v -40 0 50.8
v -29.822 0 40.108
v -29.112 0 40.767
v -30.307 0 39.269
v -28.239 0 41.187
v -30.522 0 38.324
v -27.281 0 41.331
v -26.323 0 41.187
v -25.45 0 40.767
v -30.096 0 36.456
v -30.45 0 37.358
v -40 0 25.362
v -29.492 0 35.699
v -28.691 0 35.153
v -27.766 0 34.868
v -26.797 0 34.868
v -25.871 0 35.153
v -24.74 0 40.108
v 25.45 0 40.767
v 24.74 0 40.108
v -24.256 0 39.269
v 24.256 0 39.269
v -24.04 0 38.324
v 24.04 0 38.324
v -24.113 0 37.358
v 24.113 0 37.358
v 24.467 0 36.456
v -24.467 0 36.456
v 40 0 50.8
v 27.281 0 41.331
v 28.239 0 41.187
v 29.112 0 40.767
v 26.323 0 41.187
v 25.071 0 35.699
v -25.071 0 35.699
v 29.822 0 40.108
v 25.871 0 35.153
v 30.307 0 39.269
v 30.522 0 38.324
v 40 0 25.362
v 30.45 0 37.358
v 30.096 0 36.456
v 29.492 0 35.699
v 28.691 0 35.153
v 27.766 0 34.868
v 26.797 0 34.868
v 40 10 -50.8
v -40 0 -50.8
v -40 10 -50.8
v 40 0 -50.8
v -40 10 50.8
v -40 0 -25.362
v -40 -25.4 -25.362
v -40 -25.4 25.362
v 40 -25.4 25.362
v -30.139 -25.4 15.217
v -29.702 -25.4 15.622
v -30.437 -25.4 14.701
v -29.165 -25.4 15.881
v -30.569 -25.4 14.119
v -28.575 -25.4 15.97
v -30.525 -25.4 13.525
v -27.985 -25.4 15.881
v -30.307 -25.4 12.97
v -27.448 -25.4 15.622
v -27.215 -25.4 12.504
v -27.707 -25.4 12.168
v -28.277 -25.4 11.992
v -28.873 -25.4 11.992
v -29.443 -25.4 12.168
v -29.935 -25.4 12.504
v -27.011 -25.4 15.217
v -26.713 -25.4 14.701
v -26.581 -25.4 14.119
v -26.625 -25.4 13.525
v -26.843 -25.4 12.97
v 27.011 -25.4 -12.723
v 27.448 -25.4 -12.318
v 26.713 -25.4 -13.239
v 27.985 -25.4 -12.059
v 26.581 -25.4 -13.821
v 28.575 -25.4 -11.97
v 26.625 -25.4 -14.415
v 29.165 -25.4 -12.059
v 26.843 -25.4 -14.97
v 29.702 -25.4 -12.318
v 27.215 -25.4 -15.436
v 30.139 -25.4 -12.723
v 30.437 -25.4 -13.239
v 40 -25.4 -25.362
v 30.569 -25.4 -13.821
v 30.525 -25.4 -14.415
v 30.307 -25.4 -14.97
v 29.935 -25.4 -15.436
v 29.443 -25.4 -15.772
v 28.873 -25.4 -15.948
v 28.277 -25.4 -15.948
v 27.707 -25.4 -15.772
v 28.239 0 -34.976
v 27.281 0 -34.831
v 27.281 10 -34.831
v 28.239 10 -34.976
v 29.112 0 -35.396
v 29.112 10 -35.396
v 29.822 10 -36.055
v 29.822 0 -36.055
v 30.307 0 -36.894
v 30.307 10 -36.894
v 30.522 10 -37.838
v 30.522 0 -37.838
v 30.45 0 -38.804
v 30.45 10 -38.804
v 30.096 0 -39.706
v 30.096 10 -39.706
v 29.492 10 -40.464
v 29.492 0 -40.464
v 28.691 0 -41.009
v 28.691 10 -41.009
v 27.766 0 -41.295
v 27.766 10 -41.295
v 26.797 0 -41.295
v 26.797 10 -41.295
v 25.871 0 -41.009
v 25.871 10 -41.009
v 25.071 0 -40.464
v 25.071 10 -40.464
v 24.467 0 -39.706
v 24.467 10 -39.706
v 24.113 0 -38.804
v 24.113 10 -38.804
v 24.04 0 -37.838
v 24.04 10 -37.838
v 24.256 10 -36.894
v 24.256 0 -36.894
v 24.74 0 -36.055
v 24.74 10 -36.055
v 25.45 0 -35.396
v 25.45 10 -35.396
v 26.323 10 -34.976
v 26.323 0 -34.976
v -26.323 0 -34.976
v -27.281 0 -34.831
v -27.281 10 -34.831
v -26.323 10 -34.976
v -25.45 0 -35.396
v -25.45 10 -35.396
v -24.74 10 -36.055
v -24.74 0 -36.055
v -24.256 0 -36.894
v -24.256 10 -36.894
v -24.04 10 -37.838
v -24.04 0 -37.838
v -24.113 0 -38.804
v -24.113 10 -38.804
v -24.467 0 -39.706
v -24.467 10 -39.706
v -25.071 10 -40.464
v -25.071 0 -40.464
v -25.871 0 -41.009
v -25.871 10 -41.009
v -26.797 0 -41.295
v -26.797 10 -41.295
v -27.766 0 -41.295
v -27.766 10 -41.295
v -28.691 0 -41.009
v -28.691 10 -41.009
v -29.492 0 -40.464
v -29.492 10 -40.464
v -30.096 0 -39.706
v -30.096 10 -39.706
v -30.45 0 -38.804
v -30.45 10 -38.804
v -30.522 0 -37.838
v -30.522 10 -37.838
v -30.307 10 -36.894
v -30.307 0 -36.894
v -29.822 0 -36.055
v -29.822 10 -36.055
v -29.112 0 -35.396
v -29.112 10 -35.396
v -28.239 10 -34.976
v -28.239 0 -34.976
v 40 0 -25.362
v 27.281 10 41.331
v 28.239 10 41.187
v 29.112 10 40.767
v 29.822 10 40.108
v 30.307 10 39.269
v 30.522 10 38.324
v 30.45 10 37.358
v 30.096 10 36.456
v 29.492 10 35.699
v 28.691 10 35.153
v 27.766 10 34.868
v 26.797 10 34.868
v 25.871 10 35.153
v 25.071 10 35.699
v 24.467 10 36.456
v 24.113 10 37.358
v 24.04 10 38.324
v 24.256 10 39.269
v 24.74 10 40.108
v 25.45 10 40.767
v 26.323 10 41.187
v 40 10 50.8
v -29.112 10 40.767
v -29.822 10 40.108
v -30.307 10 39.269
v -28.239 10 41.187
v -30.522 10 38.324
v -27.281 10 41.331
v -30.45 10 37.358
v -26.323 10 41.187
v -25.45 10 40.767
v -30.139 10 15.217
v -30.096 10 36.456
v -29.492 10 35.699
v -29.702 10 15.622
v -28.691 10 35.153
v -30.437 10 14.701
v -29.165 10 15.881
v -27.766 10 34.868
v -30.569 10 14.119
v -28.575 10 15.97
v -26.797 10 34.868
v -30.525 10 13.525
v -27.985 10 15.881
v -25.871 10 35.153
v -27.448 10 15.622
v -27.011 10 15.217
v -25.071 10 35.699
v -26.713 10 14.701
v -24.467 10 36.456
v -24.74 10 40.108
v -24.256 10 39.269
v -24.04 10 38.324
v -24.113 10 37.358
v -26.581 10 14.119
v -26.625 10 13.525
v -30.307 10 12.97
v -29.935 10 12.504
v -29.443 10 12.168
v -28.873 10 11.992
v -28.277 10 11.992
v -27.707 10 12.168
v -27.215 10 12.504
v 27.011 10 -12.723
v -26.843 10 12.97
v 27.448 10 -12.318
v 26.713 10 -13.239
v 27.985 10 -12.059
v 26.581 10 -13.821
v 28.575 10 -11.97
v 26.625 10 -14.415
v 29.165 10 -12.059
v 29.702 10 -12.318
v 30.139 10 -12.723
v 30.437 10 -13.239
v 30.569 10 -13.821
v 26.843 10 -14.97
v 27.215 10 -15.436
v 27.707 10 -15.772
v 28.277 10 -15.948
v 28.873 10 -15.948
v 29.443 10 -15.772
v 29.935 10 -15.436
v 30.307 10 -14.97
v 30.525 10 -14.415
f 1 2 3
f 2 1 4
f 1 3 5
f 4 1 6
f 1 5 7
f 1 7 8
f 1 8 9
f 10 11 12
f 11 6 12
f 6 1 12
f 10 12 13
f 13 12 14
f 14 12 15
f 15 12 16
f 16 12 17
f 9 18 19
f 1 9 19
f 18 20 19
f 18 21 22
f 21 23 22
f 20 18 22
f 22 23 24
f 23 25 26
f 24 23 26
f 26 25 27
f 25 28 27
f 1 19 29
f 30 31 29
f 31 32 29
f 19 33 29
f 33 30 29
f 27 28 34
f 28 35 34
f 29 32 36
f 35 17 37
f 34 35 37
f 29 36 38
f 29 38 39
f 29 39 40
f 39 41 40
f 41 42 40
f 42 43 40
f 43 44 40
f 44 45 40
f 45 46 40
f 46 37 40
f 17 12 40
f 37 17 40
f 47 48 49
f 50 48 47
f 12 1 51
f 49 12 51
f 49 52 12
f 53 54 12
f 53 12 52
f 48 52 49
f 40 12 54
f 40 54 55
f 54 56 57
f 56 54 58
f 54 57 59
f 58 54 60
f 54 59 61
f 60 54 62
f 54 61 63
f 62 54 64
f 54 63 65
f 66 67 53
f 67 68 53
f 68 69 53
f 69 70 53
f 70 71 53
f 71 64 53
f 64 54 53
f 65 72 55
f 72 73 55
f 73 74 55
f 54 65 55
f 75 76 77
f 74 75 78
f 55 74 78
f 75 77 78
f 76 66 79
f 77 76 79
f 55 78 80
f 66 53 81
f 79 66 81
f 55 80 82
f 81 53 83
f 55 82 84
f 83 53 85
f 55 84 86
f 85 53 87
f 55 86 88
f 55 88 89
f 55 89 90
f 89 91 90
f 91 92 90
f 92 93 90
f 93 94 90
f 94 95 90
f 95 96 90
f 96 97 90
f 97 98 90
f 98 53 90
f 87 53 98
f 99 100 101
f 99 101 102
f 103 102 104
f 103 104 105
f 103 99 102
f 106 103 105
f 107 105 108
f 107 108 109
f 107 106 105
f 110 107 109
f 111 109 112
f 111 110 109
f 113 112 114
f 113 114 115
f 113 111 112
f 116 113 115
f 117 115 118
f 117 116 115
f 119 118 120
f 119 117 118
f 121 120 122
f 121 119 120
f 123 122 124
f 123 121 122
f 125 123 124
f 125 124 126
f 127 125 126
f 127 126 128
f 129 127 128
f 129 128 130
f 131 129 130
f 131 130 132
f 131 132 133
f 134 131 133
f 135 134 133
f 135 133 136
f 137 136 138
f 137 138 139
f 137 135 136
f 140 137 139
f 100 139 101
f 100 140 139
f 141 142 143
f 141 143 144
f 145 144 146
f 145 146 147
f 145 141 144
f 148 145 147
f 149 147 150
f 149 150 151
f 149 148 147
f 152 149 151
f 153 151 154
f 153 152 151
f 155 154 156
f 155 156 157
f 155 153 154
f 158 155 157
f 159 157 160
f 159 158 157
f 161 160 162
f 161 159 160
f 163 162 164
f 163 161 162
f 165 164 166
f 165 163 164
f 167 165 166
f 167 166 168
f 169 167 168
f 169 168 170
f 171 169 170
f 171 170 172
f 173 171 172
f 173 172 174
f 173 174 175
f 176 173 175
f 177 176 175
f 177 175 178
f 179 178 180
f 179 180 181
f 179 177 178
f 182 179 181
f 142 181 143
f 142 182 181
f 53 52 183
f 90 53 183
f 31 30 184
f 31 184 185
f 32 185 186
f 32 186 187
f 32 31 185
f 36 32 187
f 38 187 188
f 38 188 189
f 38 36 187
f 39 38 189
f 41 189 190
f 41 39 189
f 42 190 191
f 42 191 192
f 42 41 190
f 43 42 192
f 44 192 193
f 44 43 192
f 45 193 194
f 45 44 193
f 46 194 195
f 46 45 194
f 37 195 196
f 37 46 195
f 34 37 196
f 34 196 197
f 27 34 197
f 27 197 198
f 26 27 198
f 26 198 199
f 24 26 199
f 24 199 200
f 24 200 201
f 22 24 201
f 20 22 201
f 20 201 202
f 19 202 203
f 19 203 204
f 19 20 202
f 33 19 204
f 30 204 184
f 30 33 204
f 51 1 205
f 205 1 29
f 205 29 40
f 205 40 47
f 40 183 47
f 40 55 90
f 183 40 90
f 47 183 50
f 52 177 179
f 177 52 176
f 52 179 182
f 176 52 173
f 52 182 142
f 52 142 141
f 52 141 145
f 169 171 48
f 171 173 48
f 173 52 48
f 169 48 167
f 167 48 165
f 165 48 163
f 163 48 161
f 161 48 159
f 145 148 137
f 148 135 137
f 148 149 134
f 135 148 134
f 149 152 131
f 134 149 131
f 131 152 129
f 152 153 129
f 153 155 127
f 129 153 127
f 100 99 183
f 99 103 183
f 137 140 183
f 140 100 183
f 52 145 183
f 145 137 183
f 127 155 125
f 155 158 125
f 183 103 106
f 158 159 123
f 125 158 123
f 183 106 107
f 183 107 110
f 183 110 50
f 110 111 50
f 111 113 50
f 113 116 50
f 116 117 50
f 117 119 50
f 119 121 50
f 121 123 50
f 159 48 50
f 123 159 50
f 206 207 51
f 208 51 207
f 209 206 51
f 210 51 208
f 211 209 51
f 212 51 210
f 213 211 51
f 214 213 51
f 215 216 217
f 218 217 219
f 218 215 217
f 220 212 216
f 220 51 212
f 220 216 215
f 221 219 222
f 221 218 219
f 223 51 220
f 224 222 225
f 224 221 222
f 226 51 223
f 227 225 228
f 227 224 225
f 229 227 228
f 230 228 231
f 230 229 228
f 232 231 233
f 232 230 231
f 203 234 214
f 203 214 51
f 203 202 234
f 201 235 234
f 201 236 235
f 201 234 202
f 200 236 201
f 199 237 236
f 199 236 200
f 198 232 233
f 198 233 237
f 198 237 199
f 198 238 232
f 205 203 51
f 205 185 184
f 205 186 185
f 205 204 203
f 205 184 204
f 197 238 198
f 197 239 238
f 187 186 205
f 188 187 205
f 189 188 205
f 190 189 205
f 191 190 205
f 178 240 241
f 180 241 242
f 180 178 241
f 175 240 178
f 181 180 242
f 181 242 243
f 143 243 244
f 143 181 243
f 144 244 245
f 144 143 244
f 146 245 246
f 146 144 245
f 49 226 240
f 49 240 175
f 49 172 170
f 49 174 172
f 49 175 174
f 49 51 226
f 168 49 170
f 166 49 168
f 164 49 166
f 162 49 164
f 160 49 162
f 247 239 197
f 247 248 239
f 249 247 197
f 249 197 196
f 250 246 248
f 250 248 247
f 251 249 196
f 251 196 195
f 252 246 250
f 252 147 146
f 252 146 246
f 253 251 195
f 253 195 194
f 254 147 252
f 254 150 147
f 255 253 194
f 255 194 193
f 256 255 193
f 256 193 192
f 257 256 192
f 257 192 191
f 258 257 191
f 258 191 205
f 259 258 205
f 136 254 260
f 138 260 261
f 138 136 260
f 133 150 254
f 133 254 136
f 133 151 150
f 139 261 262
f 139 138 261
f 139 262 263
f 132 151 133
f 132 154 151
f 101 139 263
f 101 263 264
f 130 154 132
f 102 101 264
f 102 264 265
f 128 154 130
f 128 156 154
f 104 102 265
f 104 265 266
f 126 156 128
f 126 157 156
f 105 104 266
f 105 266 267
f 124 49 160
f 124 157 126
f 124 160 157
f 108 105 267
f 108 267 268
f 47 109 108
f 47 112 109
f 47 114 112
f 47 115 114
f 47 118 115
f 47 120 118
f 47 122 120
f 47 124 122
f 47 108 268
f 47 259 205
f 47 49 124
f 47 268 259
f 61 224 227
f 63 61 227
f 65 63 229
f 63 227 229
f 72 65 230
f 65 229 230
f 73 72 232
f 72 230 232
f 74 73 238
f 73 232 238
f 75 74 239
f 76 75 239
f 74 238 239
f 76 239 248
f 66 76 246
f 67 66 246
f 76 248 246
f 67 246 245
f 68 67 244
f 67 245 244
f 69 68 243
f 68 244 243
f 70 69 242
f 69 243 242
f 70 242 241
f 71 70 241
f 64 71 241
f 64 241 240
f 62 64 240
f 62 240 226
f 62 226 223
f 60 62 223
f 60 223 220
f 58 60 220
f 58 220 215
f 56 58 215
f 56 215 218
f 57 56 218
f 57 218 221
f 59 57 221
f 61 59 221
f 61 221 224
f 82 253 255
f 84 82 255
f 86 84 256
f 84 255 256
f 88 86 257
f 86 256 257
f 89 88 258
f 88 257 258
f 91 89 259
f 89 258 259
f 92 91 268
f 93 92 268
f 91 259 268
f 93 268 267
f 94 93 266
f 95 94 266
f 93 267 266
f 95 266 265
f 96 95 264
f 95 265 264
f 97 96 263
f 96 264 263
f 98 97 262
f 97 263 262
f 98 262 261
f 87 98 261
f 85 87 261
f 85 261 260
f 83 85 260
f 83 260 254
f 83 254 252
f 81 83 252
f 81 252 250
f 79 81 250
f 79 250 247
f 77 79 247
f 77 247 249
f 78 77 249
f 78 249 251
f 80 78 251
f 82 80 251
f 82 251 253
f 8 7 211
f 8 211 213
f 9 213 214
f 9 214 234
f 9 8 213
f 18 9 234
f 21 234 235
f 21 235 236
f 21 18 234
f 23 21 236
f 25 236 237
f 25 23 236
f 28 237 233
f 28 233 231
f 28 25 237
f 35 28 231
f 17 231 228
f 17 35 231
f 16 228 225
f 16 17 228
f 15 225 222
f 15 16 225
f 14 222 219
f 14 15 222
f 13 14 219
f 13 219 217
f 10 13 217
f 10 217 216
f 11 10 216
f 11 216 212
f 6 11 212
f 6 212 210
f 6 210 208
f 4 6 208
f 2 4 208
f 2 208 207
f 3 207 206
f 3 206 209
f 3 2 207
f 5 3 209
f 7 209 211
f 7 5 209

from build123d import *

# Parameters (mm, degrees)
SKETCH1_W           = 80
SKETCH1_H           = 101.6
SKETCH1_R           = 3.25
BOSS_EXTRUDE1_DEPTH = 10
SKETCH1_3_W         = 80
SKETCH1_3_H         = 50.725
BOSS_EXTRUDE2_DEPTH = 25.4
SKETCH2_R           = 2
CUT_EXTRUDE1_DEPTH  = 74.7143134


with BuildPart() as part:
    # Sketch1 → Boss-Extrude1 (new body)
    with BuildSketch(Plane(origin=(0, 0, 0), x_dir=(1, 0, 0), z_dir=(0, 1, 0))):
        Rectangle(SKETCH1_W, SKETCH1_H)
        with Locations((27.28125, 38.08125)):
            Circle(SKETCH1_R, mode=Mode.SUBTRACT)
        with Locations((-27.28125, 38.08125)):
            Circle(SKETCH1_R, mode=Mode.SUBTRACT)
        with Locations((27.28125, -38.08125)):
            Circle(SKETCH1_R, mode=Mode.SUBTRACT)
        with Locations((-27.28125, -38.08125)):
            Circle(SKETCH1_R, mode=Mode.SUBTRACT)
    extrude(amount=BOSS_EXTRUDE1_DEPTH)

    # Sketch1<3> → Boss-Extrude2 (add)
    with BuildSketch(Plane(origin=(0, 0, 0), x_dir=(1, 0, 0), z_dir=(0, 1, 0))):
        Rectangle(SKETCH1_3_W, SKETCH1_3_H)
    extrude(amount=-BOSS_EXTRUDE2_DEPTH)

    # Sketch2 → Cut-Extrude1 (cut, through all)
    with BuildSketch(Plane(origin=(0, 10, 0), x_dir=(1, 0, 0), z_dir=(0, 1, 0))):
        with Locations((-28.575, -13.97)):
            Circle(SKETCH2_R)
        with Locations((28.575, 13.97)):
            Circle(SKETCH2_R)
    extrude(amount=-CUT_EXTRUDE1_DEPTH, mode=Mode.SUBTRACT)


solid = part.part
